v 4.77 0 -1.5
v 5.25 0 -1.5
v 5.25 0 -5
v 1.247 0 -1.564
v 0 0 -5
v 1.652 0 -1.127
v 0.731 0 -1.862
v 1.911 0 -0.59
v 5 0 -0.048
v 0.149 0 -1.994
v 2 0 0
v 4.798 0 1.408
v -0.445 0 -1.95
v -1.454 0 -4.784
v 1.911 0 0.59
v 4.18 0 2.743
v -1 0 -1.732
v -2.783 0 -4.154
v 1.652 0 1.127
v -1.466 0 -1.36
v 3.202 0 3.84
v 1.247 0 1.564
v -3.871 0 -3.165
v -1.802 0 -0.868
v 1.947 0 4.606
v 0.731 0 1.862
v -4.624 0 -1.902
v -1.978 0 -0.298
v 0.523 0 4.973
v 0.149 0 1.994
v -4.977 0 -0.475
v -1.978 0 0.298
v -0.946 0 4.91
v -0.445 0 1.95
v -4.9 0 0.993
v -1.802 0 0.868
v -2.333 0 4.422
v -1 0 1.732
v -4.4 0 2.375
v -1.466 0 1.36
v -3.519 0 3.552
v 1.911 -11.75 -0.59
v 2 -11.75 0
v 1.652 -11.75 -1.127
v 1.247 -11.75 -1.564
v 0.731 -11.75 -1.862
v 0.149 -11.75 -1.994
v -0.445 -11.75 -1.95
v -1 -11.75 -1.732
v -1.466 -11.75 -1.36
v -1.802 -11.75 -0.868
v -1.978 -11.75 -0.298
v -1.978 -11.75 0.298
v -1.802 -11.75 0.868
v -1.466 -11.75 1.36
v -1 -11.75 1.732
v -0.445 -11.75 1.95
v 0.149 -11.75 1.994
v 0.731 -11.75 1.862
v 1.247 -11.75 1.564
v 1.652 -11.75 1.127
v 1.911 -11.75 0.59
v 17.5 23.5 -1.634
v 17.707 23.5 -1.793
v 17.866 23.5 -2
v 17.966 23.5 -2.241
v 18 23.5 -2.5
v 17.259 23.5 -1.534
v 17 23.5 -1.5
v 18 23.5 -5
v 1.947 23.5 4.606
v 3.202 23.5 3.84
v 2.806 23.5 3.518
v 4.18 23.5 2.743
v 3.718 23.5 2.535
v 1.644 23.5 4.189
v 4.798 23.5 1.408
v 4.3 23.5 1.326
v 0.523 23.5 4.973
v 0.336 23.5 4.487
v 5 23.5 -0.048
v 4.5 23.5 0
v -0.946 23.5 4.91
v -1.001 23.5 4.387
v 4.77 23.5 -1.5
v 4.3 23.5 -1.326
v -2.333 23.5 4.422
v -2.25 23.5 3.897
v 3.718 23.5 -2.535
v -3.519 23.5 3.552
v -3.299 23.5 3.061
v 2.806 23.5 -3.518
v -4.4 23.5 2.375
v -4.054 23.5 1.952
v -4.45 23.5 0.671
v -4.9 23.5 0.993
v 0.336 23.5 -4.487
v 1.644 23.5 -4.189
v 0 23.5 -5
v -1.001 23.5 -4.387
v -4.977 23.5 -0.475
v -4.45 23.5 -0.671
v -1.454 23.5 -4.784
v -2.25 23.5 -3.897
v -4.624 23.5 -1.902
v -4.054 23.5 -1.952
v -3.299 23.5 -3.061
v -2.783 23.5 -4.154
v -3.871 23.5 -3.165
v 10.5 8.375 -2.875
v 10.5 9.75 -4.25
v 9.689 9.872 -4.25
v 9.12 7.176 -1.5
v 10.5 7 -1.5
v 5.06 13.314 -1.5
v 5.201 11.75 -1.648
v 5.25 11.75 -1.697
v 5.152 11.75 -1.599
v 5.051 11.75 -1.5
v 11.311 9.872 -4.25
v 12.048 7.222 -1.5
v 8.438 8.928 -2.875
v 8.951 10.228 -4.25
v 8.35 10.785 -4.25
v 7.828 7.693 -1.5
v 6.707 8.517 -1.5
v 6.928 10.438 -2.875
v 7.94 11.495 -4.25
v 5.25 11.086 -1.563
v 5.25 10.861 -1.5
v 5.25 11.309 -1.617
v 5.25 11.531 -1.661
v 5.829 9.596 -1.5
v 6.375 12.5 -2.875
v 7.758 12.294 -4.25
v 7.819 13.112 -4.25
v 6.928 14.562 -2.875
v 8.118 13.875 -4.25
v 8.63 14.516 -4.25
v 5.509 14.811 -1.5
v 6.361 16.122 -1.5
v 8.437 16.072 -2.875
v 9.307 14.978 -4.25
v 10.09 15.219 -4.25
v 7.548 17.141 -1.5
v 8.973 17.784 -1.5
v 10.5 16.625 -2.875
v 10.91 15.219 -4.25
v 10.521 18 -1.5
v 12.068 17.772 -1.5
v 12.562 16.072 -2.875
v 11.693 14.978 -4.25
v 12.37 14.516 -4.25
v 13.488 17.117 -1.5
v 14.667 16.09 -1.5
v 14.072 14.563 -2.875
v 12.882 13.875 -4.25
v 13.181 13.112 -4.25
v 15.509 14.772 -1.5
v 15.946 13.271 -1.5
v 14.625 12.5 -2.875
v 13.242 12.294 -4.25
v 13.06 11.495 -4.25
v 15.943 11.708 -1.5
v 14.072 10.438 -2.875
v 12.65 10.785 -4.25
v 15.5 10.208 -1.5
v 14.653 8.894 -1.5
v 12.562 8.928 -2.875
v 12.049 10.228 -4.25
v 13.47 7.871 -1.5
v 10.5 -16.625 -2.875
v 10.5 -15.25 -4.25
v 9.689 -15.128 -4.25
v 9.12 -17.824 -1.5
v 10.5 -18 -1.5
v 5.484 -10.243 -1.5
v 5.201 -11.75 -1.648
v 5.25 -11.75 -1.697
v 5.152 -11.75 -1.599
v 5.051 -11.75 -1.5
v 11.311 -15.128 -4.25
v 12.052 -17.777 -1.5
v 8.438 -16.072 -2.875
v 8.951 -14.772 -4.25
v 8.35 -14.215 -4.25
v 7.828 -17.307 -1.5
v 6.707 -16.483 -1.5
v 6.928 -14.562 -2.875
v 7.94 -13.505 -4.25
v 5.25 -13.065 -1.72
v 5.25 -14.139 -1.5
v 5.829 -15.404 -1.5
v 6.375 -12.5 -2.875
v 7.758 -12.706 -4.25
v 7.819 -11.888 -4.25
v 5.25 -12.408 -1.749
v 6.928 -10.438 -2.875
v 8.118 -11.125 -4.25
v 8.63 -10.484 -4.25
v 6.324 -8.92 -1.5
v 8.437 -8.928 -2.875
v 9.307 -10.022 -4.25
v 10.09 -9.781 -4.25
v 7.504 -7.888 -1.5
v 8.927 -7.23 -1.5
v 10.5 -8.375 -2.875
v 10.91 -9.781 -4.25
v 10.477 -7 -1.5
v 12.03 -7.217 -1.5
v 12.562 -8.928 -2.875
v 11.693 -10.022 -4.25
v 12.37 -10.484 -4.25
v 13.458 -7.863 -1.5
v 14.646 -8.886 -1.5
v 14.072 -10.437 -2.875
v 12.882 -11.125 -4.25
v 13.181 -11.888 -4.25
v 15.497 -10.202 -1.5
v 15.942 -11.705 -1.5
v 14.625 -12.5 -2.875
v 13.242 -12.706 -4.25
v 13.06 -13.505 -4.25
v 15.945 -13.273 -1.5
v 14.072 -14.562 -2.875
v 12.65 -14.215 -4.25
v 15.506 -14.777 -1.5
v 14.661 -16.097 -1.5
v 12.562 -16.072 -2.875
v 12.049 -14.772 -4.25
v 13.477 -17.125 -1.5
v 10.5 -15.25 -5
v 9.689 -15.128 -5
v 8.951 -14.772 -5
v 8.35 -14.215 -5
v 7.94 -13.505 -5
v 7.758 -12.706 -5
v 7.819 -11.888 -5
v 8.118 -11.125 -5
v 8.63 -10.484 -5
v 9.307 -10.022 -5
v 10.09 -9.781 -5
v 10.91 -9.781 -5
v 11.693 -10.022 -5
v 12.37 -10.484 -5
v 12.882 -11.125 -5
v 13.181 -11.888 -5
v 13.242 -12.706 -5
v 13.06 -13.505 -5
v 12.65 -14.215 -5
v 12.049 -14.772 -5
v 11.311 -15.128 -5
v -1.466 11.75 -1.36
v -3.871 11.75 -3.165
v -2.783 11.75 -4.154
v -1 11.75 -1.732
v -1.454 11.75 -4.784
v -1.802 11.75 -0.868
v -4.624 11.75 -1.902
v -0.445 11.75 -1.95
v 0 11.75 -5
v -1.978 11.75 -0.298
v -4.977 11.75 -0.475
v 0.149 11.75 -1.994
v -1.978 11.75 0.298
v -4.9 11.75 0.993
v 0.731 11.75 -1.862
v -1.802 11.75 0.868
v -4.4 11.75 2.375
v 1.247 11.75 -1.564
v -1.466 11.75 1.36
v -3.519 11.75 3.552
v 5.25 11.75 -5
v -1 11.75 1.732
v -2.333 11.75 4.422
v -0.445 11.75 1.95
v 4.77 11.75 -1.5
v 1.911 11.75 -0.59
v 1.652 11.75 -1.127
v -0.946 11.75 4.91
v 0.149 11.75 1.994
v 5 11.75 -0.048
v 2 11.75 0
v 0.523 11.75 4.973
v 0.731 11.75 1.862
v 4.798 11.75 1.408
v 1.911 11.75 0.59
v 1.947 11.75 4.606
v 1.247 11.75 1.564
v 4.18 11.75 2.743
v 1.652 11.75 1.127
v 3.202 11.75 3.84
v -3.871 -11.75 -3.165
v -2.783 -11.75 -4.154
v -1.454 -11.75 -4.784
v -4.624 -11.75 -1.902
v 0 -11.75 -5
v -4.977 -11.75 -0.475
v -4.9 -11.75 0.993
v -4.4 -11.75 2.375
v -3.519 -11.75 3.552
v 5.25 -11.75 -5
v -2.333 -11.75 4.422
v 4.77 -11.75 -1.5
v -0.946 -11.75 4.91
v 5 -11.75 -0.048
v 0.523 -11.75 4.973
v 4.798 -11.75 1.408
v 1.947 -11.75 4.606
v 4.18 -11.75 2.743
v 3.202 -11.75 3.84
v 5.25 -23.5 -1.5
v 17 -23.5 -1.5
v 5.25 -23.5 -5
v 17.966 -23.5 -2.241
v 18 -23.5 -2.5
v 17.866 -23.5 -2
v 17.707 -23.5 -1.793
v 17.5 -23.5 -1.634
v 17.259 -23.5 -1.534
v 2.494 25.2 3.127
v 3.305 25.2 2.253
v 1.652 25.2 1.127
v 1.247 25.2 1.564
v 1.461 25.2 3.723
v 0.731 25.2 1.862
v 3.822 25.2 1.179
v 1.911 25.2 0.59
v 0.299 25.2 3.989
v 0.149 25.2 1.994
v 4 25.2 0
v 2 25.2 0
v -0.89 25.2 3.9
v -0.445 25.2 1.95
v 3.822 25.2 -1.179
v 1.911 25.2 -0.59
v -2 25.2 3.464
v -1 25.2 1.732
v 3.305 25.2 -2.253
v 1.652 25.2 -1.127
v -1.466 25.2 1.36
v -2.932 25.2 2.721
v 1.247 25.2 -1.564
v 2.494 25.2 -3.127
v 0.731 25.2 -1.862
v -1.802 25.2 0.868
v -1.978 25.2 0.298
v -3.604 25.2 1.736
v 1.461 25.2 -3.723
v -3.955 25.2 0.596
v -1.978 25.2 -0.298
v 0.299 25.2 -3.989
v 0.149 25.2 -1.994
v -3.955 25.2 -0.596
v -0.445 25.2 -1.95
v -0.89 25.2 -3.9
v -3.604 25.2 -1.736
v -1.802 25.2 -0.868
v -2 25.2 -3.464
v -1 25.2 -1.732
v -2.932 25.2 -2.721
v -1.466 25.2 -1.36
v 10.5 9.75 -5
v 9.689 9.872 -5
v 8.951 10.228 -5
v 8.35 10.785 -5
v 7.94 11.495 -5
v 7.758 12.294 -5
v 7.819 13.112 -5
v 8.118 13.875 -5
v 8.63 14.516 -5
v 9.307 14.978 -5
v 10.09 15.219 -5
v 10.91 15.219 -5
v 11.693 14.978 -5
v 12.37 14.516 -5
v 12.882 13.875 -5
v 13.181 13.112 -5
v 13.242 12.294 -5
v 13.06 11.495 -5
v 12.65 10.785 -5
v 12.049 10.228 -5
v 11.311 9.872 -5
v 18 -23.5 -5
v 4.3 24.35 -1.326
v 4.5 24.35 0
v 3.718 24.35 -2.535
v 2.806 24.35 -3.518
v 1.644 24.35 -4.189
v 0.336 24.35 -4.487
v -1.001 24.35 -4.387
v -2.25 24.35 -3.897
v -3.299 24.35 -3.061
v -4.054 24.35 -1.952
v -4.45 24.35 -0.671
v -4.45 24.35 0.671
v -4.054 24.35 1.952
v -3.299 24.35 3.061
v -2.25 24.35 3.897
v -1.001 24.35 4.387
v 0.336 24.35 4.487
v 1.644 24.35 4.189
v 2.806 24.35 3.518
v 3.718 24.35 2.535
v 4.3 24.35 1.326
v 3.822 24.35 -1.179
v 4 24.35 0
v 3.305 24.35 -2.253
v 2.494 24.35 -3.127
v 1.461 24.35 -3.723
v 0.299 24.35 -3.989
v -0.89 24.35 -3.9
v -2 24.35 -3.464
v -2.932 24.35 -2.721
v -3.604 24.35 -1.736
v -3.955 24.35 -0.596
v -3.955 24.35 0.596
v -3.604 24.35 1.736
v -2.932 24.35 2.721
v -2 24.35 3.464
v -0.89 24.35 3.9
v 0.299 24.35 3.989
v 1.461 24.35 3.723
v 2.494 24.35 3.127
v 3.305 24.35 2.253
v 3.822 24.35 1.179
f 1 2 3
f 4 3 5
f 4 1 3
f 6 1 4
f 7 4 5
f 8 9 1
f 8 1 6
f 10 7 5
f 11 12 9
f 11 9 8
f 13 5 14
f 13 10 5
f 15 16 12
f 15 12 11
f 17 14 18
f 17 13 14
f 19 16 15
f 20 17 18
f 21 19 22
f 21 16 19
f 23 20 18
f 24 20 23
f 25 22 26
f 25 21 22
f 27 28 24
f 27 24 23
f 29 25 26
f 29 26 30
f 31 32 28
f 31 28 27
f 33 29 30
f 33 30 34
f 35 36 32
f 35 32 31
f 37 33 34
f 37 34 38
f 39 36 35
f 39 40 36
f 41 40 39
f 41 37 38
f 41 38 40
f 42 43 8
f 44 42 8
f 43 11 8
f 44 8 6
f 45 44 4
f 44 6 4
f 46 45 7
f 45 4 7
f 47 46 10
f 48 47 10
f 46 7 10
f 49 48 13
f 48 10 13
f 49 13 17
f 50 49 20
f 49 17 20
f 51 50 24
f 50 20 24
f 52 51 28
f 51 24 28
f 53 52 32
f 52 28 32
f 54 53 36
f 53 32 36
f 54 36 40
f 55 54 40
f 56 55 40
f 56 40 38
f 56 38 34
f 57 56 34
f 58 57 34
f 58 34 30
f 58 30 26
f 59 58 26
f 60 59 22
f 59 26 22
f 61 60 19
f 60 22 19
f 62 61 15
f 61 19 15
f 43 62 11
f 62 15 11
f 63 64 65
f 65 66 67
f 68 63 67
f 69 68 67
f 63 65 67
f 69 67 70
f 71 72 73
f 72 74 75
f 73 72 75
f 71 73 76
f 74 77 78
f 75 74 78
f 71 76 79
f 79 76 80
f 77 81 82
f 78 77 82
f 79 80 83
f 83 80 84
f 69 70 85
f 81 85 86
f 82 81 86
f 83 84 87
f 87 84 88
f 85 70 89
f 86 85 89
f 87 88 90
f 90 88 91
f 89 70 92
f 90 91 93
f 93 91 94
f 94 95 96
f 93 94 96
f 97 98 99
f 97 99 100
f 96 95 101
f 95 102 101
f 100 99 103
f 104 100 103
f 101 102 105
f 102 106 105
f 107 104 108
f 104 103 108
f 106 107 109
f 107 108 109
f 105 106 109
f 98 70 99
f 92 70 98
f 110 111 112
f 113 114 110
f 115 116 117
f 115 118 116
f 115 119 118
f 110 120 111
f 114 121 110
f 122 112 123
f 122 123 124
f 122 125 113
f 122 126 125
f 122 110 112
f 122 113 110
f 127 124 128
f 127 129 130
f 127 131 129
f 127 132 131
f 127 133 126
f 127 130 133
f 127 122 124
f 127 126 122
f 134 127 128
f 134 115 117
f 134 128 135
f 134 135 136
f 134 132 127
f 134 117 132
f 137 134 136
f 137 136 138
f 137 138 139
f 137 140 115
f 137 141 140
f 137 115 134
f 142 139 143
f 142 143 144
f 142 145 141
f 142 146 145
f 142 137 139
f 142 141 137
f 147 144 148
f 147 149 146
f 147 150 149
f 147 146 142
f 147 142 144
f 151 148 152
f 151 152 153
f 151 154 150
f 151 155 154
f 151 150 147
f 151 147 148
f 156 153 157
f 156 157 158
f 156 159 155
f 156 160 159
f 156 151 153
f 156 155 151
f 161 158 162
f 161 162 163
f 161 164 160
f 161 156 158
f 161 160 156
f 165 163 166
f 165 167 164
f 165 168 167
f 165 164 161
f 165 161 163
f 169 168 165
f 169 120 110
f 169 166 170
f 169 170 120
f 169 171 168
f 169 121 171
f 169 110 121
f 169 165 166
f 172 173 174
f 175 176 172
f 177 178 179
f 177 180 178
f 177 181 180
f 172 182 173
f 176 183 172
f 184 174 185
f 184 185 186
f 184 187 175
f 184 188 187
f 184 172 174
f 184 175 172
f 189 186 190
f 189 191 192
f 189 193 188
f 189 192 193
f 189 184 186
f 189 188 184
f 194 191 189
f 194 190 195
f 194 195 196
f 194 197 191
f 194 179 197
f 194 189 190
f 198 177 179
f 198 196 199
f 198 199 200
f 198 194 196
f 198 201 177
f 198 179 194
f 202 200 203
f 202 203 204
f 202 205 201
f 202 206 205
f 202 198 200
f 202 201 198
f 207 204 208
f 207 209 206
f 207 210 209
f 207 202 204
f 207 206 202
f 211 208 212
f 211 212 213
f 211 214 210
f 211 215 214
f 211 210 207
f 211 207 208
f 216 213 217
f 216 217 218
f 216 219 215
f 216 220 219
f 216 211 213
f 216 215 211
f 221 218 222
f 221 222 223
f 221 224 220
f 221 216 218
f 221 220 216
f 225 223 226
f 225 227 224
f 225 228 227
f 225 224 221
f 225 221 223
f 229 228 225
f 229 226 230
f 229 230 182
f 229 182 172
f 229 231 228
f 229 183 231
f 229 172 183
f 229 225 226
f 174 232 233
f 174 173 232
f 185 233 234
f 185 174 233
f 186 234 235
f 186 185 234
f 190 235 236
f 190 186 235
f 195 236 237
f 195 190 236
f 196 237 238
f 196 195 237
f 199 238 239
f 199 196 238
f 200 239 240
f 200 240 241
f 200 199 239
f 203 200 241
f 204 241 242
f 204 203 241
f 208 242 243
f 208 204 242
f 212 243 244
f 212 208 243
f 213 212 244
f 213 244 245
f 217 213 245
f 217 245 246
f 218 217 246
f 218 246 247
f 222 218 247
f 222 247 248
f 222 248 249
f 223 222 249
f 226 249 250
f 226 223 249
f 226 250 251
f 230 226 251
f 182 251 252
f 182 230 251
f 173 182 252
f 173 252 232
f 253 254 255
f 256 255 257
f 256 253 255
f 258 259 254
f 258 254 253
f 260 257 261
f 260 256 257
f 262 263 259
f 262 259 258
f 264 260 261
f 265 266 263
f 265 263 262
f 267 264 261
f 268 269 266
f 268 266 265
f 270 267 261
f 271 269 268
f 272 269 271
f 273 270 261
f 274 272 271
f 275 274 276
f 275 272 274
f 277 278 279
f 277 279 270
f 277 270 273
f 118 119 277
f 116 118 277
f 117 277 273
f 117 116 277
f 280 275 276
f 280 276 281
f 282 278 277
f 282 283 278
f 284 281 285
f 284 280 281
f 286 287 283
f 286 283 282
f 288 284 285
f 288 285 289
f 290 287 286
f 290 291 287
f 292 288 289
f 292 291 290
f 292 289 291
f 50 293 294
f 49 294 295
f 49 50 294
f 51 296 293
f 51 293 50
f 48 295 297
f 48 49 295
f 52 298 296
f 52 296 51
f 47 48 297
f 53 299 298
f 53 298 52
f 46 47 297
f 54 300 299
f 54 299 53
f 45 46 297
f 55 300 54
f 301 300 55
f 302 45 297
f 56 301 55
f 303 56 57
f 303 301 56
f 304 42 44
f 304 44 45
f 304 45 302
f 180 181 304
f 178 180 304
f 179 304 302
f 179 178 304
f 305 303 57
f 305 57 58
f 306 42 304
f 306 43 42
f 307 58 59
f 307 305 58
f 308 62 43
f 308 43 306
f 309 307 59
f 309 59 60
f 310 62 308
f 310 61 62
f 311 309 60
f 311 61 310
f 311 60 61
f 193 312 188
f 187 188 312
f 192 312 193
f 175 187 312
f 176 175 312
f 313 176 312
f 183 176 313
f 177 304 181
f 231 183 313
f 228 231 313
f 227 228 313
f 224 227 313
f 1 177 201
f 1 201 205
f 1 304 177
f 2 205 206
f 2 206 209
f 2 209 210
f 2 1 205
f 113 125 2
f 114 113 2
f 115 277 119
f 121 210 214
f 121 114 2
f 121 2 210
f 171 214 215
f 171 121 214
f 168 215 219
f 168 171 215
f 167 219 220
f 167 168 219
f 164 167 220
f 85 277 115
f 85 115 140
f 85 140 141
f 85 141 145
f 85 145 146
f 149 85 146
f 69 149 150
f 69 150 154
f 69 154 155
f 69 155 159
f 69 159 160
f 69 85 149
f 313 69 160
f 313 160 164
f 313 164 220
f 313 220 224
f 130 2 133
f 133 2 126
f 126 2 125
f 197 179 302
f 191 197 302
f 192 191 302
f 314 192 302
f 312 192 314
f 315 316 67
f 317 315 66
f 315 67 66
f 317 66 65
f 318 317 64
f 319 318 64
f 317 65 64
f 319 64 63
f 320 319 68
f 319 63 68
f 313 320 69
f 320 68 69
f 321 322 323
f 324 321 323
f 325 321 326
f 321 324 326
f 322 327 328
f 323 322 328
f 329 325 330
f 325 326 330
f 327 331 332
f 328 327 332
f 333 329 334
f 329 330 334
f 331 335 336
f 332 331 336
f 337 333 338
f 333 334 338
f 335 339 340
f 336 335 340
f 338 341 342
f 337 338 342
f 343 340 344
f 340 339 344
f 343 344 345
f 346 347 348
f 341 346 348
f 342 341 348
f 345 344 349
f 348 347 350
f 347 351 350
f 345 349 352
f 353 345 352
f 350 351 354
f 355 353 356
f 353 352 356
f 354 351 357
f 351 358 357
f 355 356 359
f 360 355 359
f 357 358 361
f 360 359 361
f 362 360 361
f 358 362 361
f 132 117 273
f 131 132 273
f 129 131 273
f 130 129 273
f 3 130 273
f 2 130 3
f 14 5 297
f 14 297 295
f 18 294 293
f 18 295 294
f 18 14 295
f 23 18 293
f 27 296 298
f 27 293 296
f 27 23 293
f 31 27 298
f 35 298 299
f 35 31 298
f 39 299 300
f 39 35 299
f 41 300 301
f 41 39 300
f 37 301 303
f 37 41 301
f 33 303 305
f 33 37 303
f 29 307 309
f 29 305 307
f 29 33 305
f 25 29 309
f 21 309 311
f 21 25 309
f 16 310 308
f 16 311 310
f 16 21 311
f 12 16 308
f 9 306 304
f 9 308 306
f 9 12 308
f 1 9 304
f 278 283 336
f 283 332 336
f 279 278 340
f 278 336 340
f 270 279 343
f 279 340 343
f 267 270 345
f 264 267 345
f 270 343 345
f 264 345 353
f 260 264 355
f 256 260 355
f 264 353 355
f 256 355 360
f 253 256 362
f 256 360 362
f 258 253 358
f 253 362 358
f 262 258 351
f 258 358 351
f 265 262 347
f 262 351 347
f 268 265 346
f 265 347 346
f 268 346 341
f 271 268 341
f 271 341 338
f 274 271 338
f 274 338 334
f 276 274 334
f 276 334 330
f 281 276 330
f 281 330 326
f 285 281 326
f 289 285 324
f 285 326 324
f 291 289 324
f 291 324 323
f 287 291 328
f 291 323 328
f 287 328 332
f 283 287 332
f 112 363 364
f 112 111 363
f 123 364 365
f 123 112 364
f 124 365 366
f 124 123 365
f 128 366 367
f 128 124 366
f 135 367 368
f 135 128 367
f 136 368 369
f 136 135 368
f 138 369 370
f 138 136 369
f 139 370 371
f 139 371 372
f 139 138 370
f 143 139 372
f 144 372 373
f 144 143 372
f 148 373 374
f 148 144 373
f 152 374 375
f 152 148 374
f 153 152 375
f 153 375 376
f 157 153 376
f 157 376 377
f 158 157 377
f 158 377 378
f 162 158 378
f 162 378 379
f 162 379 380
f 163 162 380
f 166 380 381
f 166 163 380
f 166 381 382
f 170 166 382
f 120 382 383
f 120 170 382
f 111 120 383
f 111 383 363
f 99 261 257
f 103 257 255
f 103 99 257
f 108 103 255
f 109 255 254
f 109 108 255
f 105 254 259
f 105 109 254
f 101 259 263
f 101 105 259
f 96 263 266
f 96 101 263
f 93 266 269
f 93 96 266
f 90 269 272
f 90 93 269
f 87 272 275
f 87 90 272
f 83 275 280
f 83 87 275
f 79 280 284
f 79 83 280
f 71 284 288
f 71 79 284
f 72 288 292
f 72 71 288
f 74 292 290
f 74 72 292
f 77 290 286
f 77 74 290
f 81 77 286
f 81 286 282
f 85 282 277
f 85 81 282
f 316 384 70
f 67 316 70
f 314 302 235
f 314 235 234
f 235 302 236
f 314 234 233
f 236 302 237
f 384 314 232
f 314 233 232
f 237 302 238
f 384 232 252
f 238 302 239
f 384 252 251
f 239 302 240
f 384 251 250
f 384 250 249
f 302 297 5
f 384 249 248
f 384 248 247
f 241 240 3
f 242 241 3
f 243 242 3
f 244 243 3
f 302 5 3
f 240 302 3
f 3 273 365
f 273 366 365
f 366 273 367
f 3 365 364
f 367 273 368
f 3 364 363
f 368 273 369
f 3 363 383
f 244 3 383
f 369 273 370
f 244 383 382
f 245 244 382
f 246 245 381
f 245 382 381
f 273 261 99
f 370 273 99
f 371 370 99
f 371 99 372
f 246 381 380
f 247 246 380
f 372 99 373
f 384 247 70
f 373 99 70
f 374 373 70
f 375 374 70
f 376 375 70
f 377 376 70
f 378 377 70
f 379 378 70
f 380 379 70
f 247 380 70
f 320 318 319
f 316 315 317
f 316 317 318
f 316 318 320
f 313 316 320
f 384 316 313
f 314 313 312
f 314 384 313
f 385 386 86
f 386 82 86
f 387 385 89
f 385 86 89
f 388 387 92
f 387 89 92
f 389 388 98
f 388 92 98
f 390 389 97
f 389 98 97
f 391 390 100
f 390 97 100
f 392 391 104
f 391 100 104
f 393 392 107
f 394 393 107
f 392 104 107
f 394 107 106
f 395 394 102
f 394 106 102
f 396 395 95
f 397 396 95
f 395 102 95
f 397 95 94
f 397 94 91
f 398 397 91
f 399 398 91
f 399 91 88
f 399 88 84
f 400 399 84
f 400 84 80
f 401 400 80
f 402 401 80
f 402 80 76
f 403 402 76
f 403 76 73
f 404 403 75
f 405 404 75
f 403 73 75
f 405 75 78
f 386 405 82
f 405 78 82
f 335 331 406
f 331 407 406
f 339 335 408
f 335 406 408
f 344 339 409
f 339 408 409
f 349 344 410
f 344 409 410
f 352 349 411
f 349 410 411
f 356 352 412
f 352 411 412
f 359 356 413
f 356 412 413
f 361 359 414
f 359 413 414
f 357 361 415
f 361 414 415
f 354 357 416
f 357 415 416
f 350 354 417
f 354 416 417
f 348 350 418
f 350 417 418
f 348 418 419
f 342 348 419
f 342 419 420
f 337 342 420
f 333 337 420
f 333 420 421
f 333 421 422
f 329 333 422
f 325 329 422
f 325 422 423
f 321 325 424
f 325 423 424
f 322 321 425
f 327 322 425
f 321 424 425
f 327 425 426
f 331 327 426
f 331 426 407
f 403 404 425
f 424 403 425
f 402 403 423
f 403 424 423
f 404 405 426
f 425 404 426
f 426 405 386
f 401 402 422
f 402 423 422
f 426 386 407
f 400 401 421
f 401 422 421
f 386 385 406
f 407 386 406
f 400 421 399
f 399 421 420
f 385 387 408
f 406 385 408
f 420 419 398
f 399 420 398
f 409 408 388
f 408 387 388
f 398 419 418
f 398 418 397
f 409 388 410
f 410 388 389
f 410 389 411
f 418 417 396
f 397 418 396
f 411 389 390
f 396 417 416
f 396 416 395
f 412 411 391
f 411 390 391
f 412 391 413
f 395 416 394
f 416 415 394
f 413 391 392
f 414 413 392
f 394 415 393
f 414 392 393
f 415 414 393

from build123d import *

# Parameters (mm, degrees)
SKETCH1_W               = 5
SKETCH1_H               = 47
SKETCH2_W               = 18
SKETCH2_H               = 47
BOSS_EXTRUDE1_DEPTH     = 3.5
CUT_EXTRUDE1_DEPTH      = 47
CUT_EXTRUDE1_DEPTH_BACK = 47
SKETCH3_W               = 94
SKETCH3_H               = 94
SKETCH5_W               = 2
SKETCH5_H               = 53.4
CUT_EXTRUDE2_DEPTH      = 23.5
CUT_EXTRUDE2_DEPTH_BACK = 23.5


with BuildPart() as part:
    # Sketch1 → Revolve1 (revolve)
    with BuildSketch(Plane.XY):
        with Locations((2.5, 0)):
            Rectangle(SKETCH1_W, SKETCH1_H)
    revolve(axis=Axis((0, -23.5, 0), (0, 1, 0)))

    # Sketch2 → Boss-Extrude1 (add)
    with BuildSketch(Plane.XY.offset(-5)):
        with Locations((9, 0)):
            Rectangle(SKETCH2_W, SKETCH2_H)
    extrude(amount=BOSS_EXTRUDE1_DEPTH)

    # Sketch3 → Cut-Extrude1 (cut, two sides: drawn at the far end of the back side and taken through both)
    with BuildSketch(Plane.XY.offset(-CUT_EXTRUDE1_DEPTH_BACK)):
        Rectangle(SKETCH3_W, SKETCH3_H)
        Polygon((-5, 23.5), (-5, 11.75), (5.25, 11.75), (5.25, 0), (-5, 0), (-5, -11.75), (5.25, -11.75), (5.25, -23.5), (18, -23.5), (18, 23.5), align=None, mode=Mode.SUBTRACT)
    extrude(amount=CUT_EXTRUDE1_DEPTH + CUT_EXTRUDE1_DEPTH_BACK, mode=Mode.SUBTRACT)

    # Sketch4 → Revolve2 (revolve)
    with BuildSketch(Plane.XY):
        Polygon((0, 25.2), (4, 25.2), (4, 24.35), (4.5, 24.35), (4.5, 23.5), (0, 23.5), align=None)
    revolve(axis=Axis((0, 23.5, 0), (0, 1, 0)))

    # Sketch5 → Cut-Revolve1 (revolve, cut)
    with BuildSketch(Plane.XY):
        with Locations((1, 0)):
            Rectangle(SKETCH5_W, SKETCH5_H)
    revolve(axis=Axis((0, -26.7, 0), (0, 1, 0)), mode=Mode.SUBTRACT)

    # Sketch6 → Cut-Revolve2 (revolve, cut)
    with BuildSketch(Plane(origin=(10.5, 0, 0), x_dir=(0, 0, -1), z_dir=(1, 0, 0))):
        Polygon((5, -12.5), (5, -15.25), (4.25, -15.25), (1.5, -18), (1.5, -12.5), align=None)
    revolve(axis=Axis((10.5, -12.5, -1.5), (0, 0, -1)), mode=Mode.SUBTRACT)

    # Sketch7 → Cut-Revolve3 (revolve, cut)
    with BuildSketch(Plane(origin=(10.5, 0, 0), x_dir=(0, 0, -1), z_dir=(1, 0, 0))):
        Polygon((5, 12.5), (5, 9.75), (4.25, 9.75), (1.5, 7), (1.5, 12.5), align=None)
    revolve(axis=Axis((10.5, 12.5, -1.5), (0, 0, -1)), mode=Mode.SUBTRACT)

    # Sketch8 → Cut-Extrude2 (cut, two sides: drawn at the far end of the back side and taken through both)
    with BuildSketch(Plane(origin=(0, 0, 0), x_dir=(1, 0, 0), z_dir=(0, 1, 0)).offset(-CUT_EXTRUDE2_DEPTH_BACK)):
        with BuildLine():
            Line((17, 1.5), (18, 1.5))
            Line((18, 1.5), (18, 2.5))
            ThreePointArc((18, 2.5), (17.707106781, 1.792893219), (17, 1.5))
        make_face()
    extrude(amount=CUT_EXTRUDE2_DEPTH + CUT_EXTRUDE2_DEPTH_BACK, mode=Mode.SUBTRACT)


solid = part.part
